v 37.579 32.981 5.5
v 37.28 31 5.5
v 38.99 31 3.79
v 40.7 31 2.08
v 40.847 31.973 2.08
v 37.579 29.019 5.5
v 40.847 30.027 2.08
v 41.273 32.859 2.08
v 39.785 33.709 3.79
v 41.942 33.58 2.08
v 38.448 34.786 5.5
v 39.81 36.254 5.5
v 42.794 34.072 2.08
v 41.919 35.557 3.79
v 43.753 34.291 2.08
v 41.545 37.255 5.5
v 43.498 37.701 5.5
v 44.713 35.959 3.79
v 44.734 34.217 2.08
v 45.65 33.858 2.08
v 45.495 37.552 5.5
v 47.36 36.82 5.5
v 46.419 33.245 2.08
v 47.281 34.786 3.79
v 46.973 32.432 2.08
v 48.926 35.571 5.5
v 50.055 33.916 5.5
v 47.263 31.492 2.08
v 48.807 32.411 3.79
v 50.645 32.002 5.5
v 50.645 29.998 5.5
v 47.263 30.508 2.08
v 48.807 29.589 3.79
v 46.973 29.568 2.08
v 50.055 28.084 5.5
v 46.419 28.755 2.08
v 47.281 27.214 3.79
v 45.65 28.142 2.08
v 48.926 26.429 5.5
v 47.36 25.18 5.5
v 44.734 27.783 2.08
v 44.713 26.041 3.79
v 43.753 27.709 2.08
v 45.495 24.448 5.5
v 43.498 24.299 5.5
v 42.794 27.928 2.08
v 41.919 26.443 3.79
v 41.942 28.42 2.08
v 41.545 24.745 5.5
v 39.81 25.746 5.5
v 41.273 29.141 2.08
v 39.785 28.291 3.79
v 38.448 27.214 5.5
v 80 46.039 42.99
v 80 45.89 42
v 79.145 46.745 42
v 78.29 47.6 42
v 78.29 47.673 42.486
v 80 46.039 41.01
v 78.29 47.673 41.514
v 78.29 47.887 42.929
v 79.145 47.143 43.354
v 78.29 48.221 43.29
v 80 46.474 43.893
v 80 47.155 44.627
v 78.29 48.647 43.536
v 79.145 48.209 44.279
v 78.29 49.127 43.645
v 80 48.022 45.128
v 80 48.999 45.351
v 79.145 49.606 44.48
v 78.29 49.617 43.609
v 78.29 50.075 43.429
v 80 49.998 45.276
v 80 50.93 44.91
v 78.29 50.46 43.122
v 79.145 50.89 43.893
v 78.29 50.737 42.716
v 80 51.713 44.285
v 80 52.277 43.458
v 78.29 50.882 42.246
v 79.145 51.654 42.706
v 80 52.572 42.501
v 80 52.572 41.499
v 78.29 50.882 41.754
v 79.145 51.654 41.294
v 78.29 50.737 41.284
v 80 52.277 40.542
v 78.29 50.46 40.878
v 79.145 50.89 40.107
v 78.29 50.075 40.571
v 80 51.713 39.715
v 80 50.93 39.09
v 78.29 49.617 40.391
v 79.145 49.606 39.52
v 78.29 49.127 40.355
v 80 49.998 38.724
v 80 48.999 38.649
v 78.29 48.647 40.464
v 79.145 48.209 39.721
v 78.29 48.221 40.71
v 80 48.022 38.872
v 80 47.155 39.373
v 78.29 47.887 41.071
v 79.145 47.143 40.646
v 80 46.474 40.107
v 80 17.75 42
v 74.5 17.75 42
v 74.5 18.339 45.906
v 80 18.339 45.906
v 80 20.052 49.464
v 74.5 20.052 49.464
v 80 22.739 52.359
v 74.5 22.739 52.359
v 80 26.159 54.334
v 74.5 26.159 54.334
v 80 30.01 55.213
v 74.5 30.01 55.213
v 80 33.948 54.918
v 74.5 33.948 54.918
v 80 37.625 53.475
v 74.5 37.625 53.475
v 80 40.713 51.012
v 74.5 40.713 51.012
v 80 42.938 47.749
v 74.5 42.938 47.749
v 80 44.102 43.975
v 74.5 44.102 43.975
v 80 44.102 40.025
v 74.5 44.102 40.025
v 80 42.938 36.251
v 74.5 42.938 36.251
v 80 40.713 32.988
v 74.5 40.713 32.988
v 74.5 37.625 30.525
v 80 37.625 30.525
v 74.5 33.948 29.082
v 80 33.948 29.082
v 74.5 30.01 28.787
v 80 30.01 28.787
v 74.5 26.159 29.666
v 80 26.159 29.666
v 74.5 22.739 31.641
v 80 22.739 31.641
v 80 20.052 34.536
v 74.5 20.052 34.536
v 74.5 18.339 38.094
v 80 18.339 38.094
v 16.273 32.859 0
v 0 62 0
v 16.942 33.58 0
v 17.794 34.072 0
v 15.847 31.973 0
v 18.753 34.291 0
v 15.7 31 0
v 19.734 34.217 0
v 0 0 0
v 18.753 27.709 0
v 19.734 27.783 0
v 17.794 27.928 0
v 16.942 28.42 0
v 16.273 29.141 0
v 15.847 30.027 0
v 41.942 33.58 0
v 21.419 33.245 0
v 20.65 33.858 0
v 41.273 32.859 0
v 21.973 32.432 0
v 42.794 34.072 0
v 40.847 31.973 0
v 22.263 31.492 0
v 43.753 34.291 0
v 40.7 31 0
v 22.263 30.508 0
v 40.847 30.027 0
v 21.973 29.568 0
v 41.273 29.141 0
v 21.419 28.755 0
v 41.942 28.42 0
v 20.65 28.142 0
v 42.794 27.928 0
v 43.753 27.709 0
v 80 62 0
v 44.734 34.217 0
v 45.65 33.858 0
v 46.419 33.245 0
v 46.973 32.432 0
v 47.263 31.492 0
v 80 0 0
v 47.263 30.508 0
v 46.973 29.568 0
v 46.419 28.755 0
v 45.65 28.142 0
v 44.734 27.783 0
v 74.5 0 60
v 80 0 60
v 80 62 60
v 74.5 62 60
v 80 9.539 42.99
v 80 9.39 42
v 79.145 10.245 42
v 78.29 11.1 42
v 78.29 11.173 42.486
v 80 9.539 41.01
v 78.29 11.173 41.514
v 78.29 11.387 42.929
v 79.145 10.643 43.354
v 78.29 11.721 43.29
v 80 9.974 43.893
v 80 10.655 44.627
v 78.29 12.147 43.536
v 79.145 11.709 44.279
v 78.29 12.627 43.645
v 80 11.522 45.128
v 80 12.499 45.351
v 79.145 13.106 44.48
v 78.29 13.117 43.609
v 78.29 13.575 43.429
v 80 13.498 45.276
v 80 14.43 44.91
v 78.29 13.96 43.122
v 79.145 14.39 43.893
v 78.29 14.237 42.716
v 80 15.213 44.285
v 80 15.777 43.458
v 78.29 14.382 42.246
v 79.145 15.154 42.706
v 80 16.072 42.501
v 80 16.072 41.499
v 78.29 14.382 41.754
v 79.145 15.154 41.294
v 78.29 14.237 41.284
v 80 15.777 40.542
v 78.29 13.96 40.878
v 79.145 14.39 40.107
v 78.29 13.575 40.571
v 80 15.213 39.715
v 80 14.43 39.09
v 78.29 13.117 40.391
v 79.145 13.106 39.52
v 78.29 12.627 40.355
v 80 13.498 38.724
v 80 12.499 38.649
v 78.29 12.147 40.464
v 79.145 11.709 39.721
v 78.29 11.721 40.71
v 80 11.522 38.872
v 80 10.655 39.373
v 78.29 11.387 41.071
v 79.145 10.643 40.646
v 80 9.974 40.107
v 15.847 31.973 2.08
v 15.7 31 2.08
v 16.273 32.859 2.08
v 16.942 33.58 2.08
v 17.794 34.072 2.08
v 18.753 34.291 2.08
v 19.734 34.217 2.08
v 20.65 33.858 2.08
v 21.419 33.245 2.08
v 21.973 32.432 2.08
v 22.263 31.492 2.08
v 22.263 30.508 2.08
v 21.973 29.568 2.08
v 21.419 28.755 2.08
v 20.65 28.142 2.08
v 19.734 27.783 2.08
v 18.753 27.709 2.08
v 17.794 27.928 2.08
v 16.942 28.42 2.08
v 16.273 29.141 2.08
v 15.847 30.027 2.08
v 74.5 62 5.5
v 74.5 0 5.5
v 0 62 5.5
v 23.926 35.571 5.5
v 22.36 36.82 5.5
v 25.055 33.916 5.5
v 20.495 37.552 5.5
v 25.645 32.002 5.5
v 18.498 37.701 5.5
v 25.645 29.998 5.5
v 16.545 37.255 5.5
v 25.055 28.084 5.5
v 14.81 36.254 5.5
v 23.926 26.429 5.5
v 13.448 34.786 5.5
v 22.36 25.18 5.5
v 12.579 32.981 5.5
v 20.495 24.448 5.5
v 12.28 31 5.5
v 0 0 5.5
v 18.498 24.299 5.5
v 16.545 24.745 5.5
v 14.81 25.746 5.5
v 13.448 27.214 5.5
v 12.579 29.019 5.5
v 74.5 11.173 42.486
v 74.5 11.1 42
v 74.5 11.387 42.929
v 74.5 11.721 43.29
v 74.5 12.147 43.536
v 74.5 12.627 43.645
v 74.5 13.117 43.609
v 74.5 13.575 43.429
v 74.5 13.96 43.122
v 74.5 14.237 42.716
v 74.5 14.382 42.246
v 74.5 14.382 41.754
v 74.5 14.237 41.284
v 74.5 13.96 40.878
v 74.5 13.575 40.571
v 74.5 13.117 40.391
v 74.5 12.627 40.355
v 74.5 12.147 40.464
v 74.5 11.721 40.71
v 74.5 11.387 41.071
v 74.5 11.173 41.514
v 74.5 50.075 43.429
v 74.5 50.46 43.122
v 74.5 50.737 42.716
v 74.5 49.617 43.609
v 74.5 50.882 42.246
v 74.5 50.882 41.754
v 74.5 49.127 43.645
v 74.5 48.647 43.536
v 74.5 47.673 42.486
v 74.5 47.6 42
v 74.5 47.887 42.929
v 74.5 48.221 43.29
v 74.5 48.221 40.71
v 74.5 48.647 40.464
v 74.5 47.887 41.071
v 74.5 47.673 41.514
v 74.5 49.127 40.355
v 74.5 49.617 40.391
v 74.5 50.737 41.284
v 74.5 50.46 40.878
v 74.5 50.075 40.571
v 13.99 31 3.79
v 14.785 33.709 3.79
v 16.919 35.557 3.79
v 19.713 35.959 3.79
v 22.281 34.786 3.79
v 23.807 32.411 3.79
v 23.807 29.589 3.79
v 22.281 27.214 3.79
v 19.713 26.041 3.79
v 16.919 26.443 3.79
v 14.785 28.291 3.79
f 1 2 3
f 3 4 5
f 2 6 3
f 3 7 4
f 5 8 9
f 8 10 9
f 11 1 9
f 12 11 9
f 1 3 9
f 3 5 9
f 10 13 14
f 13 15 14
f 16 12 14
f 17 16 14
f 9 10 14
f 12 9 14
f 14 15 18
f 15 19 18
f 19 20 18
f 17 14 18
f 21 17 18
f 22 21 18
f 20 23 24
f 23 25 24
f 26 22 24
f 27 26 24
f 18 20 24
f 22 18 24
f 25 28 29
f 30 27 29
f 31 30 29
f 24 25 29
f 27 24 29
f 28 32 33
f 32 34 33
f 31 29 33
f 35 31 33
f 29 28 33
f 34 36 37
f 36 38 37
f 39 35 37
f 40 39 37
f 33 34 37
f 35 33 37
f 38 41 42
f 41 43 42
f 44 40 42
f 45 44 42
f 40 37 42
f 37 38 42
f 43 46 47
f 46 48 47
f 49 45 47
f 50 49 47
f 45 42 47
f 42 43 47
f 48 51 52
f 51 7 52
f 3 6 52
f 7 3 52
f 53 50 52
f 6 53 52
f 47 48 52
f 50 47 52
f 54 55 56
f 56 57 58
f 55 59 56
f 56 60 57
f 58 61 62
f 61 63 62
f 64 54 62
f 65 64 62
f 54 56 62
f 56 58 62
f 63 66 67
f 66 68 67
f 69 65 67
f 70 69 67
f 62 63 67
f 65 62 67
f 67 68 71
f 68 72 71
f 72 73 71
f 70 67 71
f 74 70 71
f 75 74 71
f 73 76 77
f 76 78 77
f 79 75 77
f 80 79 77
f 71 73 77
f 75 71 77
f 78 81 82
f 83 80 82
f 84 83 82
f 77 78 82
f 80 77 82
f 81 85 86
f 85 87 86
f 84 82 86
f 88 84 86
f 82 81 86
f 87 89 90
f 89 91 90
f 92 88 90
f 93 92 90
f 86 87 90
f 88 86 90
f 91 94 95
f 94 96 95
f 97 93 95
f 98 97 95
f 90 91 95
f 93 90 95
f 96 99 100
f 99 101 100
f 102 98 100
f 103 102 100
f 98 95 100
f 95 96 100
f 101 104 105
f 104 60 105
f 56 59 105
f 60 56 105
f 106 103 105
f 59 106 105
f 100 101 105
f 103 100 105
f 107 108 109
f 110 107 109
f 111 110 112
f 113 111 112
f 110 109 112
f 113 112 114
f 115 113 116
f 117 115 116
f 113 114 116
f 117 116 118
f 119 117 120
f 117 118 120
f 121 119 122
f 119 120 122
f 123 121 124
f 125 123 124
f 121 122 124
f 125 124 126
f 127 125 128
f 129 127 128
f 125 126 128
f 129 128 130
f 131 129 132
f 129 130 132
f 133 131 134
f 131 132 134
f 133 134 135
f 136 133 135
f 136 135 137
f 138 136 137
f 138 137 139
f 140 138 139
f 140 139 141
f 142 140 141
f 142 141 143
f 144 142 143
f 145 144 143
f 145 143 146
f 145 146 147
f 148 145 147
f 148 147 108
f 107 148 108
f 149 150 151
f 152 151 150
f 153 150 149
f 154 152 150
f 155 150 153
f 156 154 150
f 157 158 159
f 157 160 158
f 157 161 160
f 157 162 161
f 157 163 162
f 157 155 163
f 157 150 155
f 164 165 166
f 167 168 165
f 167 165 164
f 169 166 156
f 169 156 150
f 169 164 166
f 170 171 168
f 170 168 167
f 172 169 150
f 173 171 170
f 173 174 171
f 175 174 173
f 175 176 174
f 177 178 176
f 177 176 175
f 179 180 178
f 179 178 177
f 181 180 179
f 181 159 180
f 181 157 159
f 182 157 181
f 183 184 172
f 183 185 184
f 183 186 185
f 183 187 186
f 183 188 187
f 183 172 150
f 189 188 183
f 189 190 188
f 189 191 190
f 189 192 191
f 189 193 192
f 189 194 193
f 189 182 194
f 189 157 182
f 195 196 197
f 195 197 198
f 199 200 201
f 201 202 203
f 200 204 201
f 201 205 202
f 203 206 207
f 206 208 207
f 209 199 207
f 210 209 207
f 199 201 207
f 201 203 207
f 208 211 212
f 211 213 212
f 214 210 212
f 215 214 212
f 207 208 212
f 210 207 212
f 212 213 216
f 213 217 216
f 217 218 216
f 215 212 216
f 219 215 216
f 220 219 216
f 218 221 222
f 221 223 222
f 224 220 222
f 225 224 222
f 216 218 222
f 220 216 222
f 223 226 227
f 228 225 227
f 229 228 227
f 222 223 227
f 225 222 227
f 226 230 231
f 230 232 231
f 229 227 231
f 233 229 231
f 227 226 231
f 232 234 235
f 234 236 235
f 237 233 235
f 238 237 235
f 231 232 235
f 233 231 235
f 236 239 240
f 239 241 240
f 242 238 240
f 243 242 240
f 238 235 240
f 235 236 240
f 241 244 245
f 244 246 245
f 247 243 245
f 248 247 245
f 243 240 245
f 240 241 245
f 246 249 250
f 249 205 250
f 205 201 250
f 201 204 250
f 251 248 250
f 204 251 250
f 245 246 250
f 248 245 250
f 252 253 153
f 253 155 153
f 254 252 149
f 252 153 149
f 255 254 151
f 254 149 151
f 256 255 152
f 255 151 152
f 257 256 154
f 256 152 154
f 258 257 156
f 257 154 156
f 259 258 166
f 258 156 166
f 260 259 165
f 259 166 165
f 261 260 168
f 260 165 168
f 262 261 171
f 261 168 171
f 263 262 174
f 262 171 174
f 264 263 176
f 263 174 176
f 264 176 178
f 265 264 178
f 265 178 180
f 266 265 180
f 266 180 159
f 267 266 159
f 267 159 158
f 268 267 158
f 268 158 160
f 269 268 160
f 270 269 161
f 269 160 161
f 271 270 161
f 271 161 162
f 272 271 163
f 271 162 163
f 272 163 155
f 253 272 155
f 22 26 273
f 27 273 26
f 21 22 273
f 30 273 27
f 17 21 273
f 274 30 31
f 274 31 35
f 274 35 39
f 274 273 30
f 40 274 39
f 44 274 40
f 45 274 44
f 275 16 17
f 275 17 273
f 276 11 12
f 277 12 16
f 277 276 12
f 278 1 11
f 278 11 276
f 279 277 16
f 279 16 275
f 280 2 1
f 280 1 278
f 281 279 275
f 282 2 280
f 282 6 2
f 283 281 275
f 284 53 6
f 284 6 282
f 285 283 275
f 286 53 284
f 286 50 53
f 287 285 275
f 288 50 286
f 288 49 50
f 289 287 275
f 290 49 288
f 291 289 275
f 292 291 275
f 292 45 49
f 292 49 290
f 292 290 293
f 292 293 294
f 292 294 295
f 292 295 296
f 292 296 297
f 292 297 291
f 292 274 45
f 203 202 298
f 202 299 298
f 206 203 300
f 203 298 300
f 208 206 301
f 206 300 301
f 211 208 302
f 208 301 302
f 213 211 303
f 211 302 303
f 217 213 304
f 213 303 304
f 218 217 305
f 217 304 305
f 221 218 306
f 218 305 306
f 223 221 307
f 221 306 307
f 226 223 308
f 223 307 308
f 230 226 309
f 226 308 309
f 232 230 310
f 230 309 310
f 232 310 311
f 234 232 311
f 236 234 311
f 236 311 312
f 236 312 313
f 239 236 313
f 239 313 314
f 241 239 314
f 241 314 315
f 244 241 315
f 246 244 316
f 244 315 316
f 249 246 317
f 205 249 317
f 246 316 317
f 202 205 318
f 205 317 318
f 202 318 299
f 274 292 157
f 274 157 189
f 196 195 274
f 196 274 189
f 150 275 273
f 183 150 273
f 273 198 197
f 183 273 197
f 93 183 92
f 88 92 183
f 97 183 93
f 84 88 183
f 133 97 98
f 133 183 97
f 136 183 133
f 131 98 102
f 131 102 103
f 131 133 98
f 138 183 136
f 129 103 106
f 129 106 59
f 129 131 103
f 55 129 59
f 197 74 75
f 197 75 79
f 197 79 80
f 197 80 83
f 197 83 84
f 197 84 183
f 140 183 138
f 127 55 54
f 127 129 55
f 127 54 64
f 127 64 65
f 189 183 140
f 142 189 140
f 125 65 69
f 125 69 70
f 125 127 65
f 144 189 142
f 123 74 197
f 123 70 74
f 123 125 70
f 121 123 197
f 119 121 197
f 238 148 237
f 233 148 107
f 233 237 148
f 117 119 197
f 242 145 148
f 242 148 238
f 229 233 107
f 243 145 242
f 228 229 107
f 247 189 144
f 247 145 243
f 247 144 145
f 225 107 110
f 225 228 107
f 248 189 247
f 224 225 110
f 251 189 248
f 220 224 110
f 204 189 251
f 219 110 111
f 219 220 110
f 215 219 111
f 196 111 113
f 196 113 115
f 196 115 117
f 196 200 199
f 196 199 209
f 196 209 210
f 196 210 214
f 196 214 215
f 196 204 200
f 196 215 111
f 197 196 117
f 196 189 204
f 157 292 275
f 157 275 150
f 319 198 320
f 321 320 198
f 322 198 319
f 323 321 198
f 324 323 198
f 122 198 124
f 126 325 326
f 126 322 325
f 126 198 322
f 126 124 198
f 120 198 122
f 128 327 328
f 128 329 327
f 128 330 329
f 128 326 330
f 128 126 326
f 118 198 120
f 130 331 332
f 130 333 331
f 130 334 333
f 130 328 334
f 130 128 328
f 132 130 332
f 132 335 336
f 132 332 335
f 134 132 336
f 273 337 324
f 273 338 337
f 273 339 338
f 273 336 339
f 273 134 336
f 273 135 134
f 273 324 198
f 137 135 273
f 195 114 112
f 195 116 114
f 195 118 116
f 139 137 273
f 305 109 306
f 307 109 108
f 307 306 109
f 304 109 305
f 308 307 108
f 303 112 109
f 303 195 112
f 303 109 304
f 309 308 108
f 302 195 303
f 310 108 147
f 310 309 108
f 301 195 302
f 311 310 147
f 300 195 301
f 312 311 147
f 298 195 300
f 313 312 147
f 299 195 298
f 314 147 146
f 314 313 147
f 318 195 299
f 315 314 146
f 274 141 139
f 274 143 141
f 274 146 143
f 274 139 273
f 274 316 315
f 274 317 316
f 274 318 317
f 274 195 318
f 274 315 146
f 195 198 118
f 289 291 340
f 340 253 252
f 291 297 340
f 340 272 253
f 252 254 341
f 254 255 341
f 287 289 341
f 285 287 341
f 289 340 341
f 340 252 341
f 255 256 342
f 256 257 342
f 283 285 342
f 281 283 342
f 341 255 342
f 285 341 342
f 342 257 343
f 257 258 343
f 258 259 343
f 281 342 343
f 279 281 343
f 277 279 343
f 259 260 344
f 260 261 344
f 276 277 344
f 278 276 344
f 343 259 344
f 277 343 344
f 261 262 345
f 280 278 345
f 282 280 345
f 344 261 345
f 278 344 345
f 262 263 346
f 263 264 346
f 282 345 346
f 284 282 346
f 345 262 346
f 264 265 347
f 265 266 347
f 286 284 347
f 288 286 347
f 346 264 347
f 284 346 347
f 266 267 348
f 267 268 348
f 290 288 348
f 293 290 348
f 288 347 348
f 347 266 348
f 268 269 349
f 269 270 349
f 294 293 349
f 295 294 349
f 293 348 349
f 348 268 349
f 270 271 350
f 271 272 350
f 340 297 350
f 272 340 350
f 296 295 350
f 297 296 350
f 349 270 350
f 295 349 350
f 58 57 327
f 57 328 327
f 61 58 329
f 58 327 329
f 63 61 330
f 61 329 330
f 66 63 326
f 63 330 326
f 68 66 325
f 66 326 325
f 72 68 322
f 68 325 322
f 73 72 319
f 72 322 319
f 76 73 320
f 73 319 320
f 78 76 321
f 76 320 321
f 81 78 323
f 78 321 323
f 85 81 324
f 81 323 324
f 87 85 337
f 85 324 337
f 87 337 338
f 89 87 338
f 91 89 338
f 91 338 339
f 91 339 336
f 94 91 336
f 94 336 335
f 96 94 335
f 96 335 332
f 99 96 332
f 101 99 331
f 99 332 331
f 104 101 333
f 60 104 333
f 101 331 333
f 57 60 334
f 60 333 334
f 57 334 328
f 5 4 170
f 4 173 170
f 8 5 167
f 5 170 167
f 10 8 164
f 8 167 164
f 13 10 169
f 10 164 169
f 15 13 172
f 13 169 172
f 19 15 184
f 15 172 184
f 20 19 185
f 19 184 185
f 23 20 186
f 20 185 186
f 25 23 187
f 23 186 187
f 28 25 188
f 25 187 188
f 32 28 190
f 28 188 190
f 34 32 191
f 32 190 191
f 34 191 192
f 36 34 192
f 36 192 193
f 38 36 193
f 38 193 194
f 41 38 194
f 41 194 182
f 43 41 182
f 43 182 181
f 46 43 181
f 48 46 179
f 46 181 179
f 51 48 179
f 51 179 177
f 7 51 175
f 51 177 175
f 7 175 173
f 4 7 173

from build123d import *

# Parameters (mm, degrees)
F1_DEPTH       = 62
F3_D           = 26.5
F5_D           = 3.3
F5_CSINK_D     = 6.72
F5_CSINK_ANGLE = 90
F7_D           = 6.6
F7_CSINK_D     = 13.44
F7_CSINK_ANGLE = 90


with BuildPart() as f1:
    # F0 (on Front) → F1 (new body)
    with BuildSketch(Plane.XZ):
        Polygon((0, 5.5), (0, 0), (80, 0), (80, 60), (74.5, 60), (74.5, 5.5), align=None)
    extrude(amount=-F1_DEPTH)

    # F3 (through all)
    with Locations(Plane.YZ.offset(80)):
        with Locations((31, 42)):
            Hole(F3_D / 2)

    # F5 (through all)
    with Locations(Plane.YZ.offset(80)):
        with Locations((12.75, 42), (49.25, 42)):
            CounterSinkHole(F5_D / 2, F5_CSINK_D / 2, counter_sink_angle=F5_CSINK_ANGLE)

    # F7 (through all)
    with Locations(Plane.XY.offset(5.5)):
        with Locations((19, 31), (44, 31)):
            CounterSinkHole(F7_D / 2, F7_CSINK_D / 2, counter_sink_angle=F7_CSINK_ANGLE)


solid = f1.part
